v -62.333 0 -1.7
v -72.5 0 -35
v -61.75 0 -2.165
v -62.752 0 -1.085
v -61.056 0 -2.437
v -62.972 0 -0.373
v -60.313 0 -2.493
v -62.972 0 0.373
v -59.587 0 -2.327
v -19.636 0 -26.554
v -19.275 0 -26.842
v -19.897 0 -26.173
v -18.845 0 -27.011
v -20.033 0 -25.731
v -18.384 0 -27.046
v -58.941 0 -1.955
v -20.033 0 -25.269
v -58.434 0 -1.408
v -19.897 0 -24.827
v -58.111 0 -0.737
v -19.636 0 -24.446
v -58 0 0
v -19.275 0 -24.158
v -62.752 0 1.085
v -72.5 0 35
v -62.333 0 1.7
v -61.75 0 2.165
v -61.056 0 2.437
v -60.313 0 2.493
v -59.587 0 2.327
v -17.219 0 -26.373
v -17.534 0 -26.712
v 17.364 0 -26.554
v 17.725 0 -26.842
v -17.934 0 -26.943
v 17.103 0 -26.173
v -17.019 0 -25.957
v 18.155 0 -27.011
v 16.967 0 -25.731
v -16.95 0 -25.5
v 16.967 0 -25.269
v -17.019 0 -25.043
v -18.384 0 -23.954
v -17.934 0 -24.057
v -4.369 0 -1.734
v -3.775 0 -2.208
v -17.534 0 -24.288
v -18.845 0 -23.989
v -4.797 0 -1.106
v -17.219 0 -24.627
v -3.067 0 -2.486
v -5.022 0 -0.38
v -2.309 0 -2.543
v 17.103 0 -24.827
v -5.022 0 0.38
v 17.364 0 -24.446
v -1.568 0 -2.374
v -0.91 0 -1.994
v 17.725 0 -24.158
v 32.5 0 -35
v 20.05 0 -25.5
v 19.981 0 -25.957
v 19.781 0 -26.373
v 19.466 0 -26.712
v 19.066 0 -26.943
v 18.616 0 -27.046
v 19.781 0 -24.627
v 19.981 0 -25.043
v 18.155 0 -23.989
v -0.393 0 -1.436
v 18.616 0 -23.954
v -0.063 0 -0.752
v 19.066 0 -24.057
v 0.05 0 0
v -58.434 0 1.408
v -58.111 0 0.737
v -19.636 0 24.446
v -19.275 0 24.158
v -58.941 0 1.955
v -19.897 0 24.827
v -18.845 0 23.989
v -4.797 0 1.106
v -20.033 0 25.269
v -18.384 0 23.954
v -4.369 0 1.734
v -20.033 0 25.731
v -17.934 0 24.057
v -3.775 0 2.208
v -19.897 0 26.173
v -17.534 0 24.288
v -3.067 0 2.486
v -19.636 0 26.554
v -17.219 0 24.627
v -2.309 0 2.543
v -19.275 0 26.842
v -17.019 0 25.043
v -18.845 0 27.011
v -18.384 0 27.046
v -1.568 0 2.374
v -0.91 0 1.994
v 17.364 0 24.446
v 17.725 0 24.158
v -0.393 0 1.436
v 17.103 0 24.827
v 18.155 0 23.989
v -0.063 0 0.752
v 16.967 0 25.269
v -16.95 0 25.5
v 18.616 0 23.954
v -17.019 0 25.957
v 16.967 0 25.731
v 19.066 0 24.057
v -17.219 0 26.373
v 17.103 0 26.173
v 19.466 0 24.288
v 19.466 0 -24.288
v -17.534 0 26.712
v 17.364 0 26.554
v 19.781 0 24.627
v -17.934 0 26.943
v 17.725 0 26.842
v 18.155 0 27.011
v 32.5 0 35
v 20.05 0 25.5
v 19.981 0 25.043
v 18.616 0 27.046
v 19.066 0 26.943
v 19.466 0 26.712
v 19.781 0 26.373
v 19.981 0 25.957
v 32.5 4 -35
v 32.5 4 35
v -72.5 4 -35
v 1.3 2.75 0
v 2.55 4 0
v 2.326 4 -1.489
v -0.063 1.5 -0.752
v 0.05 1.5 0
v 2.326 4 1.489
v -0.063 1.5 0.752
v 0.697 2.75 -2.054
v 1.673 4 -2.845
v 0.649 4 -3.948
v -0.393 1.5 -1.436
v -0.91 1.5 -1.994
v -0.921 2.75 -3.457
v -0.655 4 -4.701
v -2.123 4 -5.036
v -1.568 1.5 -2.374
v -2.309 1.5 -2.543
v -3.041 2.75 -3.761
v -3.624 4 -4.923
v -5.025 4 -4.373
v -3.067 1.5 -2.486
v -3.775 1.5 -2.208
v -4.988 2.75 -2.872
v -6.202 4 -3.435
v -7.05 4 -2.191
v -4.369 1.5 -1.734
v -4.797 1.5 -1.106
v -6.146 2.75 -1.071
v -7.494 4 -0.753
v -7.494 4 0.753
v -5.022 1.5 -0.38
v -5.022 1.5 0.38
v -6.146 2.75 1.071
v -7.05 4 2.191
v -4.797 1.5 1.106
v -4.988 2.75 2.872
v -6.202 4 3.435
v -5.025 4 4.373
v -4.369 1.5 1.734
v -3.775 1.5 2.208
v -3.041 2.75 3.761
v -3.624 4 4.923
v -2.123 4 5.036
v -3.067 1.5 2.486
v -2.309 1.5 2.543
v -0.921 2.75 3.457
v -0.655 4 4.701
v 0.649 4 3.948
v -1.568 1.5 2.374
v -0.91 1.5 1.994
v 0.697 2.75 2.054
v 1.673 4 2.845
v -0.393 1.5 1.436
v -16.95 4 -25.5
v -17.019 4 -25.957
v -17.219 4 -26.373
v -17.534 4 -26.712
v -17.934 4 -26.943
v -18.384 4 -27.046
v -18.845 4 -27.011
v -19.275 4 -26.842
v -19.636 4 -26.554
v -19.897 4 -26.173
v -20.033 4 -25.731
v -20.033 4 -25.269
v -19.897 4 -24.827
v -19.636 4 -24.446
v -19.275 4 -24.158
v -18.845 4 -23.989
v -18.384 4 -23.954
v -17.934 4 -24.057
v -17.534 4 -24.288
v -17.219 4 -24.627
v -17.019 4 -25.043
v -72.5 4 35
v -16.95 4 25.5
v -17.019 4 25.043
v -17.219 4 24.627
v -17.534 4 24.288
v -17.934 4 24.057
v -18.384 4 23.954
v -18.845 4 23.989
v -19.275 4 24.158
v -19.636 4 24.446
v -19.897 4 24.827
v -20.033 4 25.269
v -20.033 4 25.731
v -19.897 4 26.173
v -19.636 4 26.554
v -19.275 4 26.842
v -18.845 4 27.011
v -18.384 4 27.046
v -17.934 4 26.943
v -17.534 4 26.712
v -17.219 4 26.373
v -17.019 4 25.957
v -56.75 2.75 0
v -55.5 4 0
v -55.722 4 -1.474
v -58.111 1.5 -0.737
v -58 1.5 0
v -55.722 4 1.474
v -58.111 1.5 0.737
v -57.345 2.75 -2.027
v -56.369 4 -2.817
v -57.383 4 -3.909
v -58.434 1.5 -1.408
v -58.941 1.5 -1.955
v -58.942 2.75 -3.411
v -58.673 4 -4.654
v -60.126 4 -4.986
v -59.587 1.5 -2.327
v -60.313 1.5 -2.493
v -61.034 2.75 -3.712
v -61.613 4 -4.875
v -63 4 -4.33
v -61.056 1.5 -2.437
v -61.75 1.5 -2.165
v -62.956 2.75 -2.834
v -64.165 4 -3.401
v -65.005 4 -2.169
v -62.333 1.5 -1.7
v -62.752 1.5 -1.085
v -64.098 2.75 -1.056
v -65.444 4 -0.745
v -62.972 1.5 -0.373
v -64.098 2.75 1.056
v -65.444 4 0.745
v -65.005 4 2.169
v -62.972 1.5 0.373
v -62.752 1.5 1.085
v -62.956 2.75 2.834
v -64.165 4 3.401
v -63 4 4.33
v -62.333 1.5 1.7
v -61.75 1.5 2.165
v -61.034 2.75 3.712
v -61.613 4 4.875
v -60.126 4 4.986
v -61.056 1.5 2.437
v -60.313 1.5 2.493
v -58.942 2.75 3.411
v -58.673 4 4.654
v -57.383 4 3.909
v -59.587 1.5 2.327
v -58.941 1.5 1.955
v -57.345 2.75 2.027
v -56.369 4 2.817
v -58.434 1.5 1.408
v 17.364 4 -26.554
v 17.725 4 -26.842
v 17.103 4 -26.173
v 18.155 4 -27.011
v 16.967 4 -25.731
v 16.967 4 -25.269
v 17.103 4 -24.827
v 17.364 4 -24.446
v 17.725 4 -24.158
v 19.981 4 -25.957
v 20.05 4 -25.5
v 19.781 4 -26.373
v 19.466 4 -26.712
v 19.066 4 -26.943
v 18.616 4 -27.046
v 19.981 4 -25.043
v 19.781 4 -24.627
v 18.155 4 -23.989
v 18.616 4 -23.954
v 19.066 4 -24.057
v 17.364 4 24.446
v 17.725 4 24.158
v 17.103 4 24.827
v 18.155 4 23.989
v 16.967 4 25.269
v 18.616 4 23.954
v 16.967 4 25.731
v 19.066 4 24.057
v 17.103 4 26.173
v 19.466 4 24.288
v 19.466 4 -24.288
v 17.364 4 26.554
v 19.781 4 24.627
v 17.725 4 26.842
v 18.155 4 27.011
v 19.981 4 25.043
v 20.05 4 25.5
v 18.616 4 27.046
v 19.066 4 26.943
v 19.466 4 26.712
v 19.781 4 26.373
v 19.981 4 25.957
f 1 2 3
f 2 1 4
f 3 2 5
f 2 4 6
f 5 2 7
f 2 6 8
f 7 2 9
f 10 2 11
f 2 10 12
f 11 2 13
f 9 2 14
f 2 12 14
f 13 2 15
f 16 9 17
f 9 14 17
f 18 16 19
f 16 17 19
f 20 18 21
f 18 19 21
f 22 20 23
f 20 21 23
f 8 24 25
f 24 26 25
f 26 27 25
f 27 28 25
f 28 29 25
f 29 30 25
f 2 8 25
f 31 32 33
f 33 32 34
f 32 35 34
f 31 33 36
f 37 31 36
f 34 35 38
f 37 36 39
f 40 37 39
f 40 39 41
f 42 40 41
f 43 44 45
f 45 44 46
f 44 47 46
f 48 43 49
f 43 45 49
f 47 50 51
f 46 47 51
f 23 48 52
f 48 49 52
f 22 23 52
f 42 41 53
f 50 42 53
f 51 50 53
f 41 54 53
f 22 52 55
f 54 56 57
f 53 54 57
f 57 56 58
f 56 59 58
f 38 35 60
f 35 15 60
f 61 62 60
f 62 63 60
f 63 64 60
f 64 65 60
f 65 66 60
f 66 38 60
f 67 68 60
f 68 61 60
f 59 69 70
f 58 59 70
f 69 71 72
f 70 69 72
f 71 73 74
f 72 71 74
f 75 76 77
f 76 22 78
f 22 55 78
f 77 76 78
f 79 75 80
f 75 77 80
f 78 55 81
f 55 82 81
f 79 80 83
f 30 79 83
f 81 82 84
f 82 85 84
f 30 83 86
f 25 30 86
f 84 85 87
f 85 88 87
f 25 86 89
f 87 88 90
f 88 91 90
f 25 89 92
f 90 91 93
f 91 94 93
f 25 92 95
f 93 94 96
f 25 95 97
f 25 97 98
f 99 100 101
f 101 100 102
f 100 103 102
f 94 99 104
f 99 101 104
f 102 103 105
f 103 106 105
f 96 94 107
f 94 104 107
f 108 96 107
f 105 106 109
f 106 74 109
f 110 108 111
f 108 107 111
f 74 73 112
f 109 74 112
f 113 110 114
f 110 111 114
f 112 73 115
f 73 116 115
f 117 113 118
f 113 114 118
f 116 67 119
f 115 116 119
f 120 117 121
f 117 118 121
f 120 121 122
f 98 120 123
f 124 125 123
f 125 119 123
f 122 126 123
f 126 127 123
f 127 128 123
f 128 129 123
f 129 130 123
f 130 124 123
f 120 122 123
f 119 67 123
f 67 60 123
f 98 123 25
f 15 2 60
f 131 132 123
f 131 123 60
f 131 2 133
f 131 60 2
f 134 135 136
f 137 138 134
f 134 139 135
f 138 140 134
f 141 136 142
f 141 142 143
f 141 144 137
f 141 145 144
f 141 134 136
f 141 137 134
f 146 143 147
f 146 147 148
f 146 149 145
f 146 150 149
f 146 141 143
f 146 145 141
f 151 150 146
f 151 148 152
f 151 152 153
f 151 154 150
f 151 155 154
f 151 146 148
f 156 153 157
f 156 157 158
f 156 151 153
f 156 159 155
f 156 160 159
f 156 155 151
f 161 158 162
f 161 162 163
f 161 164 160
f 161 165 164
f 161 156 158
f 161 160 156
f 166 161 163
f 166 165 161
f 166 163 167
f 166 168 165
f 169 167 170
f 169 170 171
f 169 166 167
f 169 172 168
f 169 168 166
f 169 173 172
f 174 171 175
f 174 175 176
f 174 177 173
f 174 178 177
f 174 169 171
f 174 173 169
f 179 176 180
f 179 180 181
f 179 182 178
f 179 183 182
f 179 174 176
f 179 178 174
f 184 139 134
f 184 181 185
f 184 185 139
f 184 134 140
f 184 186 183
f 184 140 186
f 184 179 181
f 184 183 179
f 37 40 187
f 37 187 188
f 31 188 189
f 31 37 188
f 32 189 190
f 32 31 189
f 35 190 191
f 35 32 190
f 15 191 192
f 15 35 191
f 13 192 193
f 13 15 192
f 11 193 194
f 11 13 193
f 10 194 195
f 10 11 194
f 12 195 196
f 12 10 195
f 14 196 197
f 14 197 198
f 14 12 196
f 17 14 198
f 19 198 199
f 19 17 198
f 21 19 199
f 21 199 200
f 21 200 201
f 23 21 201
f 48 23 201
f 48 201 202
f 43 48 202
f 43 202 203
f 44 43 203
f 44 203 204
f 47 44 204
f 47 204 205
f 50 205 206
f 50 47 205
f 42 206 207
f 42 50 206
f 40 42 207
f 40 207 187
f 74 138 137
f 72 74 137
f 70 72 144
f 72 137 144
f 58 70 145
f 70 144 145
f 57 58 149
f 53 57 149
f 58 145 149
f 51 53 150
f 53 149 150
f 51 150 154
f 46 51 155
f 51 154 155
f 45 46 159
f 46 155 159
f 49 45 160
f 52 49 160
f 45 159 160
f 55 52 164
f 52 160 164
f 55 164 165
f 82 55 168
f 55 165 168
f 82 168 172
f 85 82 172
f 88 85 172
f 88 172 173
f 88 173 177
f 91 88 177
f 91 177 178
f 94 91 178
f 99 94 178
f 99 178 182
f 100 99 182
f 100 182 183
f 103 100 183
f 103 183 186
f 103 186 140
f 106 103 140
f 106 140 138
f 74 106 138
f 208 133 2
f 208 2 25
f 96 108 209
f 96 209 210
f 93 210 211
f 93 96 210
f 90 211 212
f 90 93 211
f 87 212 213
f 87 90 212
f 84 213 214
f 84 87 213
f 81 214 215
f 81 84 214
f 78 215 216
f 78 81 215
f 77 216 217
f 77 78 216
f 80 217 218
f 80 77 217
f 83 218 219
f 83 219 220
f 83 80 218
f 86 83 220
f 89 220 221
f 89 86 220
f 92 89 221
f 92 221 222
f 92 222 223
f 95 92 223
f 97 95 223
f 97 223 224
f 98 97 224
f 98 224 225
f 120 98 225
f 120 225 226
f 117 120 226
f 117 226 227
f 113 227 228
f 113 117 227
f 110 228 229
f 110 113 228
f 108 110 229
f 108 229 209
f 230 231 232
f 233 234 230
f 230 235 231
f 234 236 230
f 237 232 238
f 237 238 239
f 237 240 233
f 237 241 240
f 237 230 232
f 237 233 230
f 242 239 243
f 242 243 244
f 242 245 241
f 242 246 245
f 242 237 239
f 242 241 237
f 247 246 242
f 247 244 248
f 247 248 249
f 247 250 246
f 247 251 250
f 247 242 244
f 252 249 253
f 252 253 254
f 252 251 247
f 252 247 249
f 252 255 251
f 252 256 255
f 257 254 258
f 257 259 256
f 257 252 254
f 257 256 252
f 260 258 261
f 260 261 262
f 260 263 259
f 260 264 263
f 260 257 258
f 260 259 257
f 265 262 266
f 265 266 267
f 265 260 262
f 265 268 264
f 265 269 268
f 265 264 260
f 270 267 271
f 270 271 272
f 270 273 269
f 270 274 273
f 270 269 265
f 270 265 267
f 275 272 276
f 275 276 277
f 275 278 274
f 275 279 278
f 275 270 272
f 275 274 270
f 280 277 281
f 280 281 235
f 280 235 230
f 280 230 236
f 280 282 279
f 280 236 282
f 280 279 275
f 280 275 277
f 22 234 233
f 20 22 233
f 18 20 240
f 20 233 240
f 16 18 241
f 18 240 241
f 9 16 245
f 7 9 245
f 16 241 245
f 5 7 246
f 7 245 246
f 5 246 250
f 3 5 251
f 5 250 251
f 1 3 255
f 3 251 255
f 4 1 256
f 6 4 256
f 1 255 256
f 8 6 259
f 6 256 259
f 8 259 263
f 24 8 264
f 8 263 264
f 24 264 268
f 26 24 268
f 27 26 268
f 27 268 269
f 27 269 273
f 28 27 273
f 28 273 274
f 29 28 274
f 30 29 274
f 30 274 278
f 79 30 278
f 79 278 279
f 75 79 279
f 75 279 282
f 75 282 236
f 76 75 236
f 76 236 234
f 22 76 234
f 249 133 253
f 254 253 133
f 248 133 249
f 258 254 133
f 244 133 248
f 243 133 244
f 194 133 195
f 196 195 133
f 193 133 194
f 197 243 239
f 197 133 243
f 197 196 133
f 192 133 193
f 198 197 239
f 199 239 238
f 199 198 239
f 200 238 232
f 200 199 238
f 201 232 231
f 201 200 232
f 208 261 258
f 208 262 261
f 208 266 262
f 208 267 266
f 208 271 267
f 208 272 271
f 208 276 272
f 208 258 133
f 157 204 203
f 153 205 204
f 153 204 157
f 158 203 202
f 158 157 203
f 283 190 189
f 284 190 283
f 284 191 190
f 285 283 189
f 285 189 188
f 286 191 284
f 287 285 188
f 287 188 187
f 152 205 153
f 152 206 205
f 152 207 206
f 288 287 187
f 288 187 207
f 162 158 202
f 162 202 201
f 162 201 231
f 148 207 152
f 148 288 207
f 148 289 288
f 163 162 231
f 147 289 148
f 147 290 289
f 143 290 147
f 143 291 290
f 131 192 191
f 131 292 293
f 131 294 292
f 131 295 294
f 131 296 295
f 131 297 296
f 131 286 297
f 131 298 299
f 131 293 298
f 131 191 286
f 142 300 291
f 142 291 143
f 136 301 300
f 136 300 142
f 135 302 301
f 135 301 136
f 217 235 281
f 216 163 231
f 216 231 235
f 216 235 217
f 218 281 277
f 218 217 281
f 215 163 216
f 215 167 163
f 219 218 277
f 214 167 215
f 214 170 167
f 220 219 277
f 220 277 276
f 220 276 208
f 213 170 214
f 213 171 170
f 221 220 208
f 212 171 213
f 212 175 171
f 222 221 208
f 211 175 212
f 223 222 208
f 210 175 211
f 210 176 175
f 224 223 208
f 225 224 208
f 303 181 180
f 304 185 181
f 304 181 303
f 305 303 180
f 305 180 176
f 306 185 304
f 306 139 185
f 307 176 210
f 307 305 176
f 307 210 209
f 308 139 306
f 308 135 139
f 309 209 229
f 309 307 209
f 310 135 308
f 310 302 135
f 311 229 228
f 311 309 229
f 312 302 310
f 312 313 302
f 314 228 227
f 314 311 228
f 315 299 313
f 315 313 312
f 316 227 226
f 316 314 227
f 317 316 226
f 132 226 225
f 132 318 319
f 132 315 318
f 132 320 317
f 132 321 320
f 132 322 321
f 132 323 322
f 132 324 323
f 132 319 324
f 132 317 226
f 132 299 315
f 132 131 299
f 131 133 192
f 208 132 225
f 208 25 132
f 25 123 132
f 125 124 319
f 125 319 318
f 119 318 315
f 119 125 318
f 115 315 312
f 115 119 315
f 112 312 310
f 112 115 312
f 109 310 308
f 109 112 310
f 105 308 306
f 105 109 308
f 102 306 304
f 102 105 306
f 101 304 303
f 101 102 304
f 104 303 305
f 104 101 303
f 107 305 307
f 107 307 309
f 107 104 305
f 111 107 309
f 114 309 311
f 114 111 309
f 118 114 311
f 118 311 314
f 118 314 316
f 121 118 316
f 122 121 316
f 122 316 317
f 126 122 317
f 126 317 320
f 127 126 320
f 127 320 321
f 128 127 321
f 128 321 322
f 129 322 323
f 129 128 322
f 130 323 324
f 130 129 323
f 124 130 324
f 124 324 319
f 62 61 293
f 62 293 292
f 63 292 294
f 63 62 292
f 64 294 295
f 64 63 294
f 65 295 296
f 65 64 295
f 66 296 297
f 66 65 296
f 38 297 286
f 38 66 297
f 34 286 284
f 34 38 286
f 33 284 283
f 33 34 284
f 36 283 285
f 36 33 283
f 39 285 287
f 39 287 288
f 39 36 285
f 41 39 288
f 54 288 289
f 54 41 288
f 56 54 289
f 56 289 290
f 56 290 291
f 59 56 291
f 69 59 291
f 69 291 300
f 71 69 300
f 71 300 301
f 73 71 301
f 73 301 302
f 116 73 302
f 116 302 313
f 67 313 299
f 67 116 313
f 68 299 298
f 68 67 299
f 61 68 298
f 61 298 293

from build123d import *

# Parameters (mm, degrees)
SKETCH_1_W          = 45
SKETCH_1_H          = 70
SKETCH_1_R          = 1.55
EXTRUDE_1_DEPTH     = 4
SKETCH_3_W          = 70
SKETCH_3_H          = 4
EXTRUDE_3_DEPTH     = 40
SKETCH_4_R          = 2.55
CUT_EXTRUDE_1_DEPTH = 6
CHAMFER_1_SIZE      = 2.5
SKETCH_5_W          = 70
SKETCH_5_H          = 4
EXTRUDE_4_DEPTH     = 10
SKETCH_6_W          = 70
SKETCH_6_H          = 4
EXTRUDE_5_DEPTH     = 10
SKETCH_7_R          = 2.5
CUT_EXTRUDE_2_DEPTH = 10
CHAMFER_3_SIZE      = 2.5


with BuildPart() as part:
    # 草图1 → 凸台-拉伸1 (new body)
    with BuildSketch(Plane(origin=(0, 0, 0), x_dir=(1, 0, 0), z_dir=(0, 1, 0))):
        Rectangle(SKETCH_1_W, SKETCH_1_H)
        with Locations((18.5, 25.5)):
            Circle(SKETCH_1_R, mode=Mode.SUBTRACT)
        with Locations((-18.5, 25.5)):
            Circle(SKETCH_1_R, mode=Mode.SUBTRACT)
        with Locations((-18.5, -25.5)):
            Circle(SKETCH_1_R, mode=Mode.SUBTRACT)
        with Locations((18.5, -25.5)):
            Circle(SKETCH_1_R, mode=Mode.SUBTRACT)
    extrude(amount=EXTRUDE_1_DEPTH)

    # 草图3 → 凸台-拉伸3 (add)
    with BuildSketch(Plane.ZY.offset(22.5)):
        with Locations((0, 2)):
            Rectangle(SKETCH_3_W, SKETCH_3_H)
    extrude(amount=EXTRUDE_3_DEPTH)

    # 草图4 → 切除-拉伸1 (cut)
    with BuildSketch(Plane(origin=(0, 4, 0), x_dir=(1, 0, 0), z_dir=(0, 1, 0))):
        with Locations((-2.5, 0)):
            Circle(SKETCH_4_R)
    extrude(amount=-CUT_EXTRUDE_1_DEPTH, mode=Mode.SUBTRACT)

    # 倒角1
    chamfer_1_edges = [part.edges().sort_by_distance(p)[0] for p in [
        (-5.05, 4, 0),
    ]]
    chamfer(chamfer_1_edges, length=CHAMFER_1_SIZE)

    # 草图5 → 凸台-拉伸4 (add)
    with BuildSketch(Plane(origin=(22.5, 0, 0), x_dir=(0, 0, -1), z_dir=(1, 0, 0))):
        with Locations((0, 2)):
            Rectangle(SKETCH_5_W, SKETCH_5_H)
    extrude(amount=EXTRUDE_4_DEPTH)

    # 草图6 → 凸台-拉伸5 (add)
    with BuildSketch(Plane.ZY.offset(62.5)):
        with Locations((0, 2)):
            Rectangle(SKETCH_6_W, SKETCH_6_H)
    extrude(amount=EXTRUDE_5_DEPTH)

    # 草图7 → 切除-拉伸2 (cut)
    with BuildSketch(Plane(origin=(0, 4, 0), x_dir=(1, 0, 0), z_dir=(0, 1, 0))):
        with Locations((-60.5, 0)):
            Circle(SKETCH_7_R)
    extrude(amount=-CUT_EXTRUDE_2_DEPTH, mode=Mode.SUBTRACT)

    # 倒角3
    chamfer_3_edges = [part.edges().sort_by_distance(p)[0] for p in [
        (-63, 4, 0),
    ]]
    chamfer(chamfer_3_edges, length=CHAMFER_3_SIZE)


solid = part.part
